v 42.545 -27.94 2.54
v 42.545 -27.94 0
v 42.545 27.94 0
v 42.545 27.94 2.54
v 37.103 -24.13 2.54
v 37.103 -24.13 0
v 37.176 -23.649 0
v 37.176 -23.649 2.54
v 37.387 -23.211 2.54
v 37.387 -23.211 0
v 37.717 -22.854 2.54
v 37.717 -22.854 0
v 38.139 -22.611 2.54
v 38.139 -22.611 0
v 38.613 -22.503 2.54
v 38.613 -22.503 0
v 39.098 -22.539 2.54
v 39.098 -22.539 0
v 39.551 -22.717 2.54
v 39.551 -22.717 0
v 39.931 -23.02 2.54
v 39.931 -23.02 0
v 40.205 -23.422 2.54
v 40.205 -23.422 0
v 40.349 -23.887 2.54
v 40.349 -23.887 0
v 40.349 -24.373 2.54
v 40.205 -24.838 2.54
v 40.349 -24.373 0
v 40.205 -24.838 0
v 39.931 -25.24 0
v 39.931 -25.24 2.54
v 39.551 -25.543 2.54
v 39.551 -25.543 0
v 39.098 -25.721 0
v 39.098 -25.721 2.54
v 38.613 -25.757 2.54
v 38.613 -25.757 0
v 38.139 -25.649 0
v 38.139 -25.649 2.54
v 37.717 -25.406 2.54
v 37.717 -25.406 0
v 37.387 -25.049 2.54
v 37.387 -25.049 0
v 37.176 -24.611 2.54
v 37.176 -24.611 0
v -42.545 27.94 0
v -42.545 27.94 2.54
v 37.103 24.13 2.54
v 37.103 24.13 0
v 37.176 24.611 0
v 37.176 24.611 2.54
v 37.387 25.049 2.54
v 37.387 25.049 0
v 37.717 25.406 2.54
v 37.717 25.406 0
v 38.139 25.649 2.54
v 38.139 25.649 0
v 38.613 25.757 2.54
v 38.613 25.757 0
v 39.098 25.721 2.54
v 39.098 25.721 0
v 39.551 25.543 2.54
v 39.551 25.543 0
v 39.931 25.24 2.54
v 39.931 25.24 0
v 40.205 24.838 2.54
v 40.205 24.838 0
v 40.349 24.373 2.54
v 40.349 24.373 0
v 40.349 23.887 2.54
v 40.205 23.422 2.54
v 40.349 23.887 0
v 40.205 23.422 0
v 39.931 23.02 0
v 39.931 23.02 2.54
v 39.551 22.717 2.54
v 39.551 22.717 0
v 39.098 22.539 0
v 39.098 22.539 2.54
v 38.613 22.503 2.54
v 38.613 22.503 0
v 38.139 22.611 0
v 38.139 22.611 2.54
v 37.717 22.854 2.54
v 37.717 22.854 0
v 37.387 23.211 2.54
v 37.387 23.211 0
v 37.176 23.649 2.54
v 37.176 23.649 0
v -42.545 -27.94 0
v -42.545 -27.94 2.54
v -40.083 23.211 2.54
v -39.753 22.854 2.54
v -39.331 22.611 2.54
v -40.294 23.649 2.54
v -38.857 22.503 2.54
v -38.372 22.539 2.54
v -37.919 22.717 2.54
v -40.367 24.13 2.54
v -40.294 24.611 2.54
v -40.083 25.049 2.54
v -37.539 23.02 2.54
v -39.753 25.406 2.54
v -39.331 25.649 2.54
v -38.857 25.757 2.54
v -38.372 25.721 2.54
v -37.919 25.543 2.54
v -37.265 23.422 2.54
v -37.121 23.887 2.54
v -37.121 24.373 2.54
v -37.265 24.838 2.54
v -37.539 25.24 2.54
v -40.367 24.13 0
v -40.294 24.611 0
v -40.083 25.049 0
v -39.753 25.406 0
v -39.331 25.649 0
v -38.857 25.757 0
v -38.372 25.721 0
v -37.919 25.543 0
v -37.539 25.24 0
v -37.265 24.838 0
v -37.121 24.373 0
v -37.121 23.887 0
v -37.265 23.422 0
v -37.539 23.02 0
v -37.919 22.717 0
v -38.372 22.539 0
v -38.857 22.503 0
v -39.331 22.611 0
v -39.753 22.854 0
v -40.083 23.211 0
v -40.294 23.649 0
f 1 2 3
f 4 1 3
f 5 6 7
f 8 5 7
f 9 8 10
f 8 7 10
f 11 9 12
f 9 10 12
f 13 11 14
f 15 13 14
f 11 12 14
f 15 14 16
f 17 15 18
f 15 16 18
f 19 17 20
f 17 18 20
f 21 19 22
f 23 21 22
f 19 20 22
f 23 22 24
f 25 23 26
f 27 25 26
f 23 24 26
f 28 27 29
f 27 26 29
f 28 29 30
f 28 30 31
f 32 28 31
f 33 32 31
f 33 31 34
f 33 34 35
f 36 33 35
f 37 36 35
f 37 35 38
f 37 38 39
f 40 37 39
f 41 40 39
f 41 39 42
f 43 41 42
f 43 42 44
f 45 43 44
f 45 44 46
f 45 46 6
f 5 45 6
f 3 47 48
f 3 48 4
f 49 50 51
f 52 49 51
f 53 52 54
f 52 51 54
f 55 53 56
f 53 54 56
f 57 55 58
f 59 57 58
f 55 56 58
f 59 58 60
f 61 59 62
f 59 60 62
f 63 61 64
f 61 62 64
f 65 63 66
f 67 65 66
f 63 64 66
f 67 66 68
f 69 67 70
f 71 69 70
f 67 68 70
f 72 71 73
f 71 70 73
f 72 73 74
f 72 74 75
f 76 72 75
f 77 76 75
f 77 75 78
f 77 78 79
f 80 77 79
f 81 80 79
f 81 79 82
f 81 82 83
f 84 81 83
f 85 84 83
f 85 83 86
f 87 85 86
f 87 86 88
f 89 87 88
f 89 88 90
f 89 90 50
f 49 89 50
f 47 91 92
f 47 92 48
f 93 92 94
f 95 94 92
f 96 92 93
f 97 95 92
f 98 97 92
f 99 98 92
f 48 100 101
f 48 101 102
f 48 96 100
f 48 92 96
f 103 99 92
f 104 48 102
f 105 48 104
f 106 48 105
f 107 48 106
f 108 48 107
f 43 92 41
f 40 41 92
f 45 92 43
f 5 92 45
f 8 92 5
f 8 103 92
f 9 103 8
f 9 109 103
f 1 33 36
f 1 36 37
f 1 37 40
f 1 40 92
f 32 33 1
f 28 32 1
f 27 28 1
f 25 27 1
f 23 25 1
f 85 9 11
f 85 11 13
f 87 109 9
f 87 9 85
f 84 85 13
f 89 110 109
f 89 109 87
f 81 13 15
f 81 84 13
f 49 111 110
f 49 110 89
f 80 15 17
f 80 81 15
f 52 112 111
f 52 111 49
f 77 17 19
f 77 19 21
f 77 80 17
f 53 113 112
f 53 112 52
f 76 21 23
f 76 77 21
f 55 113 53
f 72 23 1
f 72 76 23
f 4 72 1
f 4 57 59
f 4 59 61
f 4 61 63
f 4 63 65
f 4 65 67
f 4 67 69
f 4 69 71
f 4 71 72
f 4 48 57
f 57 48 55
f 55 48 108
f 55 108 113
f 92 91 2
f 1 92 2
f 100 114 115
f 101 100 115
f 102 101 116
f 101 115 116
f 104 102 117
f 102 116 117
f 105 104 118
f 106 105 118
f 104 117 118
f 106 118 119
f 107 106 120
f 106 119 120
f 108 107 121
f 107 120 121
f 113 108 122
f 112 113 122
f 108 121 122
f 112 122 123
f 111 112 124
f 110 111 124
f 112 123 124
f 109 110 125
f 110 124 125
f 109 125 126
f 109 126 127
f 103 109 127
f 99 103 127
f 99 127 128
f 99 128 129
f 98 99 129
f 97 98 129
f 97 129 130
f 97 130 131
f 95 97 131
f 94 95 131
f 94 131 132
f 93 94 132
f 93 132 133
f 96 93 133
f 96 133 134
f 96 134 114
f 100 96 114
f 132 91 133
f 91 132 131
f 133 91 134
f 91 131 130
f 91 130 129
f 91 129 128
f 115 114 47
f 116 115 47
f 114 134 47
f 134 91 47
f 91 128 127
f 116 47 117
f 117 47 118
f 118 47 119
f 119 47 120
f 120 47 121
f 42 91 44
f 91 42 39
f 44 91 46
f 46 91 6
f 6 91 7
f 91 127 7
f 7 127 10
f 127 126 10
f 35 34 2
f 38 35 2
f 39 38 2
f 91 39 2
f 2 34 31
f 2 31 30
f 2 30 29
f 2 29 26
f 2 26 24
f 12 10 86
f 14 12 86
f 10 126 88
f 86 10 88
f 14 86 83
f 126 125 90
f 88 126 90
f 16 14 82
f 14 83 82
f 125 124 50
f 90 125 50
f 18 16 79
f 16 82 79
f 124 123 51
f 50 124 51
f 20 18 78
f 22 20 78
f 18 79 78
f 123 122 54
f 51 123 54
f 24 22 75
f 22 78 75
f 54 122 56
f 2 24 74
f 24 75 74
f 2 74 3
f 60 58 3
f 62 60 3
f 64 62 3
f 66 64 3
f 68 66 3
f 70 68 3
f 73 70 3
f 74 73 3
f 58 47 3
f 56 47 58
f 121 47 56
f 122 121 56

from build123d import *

# Parameters (mm, degrees)
SKETCH1_W                 = 85.09
SKETCH1_H                 = 55.88
BOSS_EXTRUDE1_DEPTH       = 2.54
F_4_CLEARANCE_HOLE1_D     = 3.2639
F_4_CLEARANCE_HOLE1_DEPTH = 9.652
F_4_CLEARANCE_HOLE1_TIP   = 0.980574487


with BuildPart() as part:
    # Sketch1 → Boss-Extrude1 (new body)
    with BuildSketch(Plane.XY):
        Rectangle(SKETCH1_W, SKETCH1_H)
    extrude(amount=BOSS_EXTRUDE1_DEPTH)

    # #4 Clearance Hole1
    with Locations(Plane.XY.offset(2.54)):
        with Locations((-38.735, 24.13), (38.735, -24.13), (38.735, 24.13)):
            Hole(F_4_CLEARANCE_HOLE1_D / 2, depth=F_4_CLEARANCE_HOLE1_DEPTH)
            with Locations((0, 0, -(F_4_CLEARANCE_HOLE1_DEPTH + F_4_CLEARANCE_HOLE1_TIP / 2))):  # 118° drill point
                Cone(0, F_4_CLEARANCE_HOLE1_D / 2, F_4_CLEARANCE_HOLE1_TIP, mode=Mode.SUBTRACT)


solid = part.part
